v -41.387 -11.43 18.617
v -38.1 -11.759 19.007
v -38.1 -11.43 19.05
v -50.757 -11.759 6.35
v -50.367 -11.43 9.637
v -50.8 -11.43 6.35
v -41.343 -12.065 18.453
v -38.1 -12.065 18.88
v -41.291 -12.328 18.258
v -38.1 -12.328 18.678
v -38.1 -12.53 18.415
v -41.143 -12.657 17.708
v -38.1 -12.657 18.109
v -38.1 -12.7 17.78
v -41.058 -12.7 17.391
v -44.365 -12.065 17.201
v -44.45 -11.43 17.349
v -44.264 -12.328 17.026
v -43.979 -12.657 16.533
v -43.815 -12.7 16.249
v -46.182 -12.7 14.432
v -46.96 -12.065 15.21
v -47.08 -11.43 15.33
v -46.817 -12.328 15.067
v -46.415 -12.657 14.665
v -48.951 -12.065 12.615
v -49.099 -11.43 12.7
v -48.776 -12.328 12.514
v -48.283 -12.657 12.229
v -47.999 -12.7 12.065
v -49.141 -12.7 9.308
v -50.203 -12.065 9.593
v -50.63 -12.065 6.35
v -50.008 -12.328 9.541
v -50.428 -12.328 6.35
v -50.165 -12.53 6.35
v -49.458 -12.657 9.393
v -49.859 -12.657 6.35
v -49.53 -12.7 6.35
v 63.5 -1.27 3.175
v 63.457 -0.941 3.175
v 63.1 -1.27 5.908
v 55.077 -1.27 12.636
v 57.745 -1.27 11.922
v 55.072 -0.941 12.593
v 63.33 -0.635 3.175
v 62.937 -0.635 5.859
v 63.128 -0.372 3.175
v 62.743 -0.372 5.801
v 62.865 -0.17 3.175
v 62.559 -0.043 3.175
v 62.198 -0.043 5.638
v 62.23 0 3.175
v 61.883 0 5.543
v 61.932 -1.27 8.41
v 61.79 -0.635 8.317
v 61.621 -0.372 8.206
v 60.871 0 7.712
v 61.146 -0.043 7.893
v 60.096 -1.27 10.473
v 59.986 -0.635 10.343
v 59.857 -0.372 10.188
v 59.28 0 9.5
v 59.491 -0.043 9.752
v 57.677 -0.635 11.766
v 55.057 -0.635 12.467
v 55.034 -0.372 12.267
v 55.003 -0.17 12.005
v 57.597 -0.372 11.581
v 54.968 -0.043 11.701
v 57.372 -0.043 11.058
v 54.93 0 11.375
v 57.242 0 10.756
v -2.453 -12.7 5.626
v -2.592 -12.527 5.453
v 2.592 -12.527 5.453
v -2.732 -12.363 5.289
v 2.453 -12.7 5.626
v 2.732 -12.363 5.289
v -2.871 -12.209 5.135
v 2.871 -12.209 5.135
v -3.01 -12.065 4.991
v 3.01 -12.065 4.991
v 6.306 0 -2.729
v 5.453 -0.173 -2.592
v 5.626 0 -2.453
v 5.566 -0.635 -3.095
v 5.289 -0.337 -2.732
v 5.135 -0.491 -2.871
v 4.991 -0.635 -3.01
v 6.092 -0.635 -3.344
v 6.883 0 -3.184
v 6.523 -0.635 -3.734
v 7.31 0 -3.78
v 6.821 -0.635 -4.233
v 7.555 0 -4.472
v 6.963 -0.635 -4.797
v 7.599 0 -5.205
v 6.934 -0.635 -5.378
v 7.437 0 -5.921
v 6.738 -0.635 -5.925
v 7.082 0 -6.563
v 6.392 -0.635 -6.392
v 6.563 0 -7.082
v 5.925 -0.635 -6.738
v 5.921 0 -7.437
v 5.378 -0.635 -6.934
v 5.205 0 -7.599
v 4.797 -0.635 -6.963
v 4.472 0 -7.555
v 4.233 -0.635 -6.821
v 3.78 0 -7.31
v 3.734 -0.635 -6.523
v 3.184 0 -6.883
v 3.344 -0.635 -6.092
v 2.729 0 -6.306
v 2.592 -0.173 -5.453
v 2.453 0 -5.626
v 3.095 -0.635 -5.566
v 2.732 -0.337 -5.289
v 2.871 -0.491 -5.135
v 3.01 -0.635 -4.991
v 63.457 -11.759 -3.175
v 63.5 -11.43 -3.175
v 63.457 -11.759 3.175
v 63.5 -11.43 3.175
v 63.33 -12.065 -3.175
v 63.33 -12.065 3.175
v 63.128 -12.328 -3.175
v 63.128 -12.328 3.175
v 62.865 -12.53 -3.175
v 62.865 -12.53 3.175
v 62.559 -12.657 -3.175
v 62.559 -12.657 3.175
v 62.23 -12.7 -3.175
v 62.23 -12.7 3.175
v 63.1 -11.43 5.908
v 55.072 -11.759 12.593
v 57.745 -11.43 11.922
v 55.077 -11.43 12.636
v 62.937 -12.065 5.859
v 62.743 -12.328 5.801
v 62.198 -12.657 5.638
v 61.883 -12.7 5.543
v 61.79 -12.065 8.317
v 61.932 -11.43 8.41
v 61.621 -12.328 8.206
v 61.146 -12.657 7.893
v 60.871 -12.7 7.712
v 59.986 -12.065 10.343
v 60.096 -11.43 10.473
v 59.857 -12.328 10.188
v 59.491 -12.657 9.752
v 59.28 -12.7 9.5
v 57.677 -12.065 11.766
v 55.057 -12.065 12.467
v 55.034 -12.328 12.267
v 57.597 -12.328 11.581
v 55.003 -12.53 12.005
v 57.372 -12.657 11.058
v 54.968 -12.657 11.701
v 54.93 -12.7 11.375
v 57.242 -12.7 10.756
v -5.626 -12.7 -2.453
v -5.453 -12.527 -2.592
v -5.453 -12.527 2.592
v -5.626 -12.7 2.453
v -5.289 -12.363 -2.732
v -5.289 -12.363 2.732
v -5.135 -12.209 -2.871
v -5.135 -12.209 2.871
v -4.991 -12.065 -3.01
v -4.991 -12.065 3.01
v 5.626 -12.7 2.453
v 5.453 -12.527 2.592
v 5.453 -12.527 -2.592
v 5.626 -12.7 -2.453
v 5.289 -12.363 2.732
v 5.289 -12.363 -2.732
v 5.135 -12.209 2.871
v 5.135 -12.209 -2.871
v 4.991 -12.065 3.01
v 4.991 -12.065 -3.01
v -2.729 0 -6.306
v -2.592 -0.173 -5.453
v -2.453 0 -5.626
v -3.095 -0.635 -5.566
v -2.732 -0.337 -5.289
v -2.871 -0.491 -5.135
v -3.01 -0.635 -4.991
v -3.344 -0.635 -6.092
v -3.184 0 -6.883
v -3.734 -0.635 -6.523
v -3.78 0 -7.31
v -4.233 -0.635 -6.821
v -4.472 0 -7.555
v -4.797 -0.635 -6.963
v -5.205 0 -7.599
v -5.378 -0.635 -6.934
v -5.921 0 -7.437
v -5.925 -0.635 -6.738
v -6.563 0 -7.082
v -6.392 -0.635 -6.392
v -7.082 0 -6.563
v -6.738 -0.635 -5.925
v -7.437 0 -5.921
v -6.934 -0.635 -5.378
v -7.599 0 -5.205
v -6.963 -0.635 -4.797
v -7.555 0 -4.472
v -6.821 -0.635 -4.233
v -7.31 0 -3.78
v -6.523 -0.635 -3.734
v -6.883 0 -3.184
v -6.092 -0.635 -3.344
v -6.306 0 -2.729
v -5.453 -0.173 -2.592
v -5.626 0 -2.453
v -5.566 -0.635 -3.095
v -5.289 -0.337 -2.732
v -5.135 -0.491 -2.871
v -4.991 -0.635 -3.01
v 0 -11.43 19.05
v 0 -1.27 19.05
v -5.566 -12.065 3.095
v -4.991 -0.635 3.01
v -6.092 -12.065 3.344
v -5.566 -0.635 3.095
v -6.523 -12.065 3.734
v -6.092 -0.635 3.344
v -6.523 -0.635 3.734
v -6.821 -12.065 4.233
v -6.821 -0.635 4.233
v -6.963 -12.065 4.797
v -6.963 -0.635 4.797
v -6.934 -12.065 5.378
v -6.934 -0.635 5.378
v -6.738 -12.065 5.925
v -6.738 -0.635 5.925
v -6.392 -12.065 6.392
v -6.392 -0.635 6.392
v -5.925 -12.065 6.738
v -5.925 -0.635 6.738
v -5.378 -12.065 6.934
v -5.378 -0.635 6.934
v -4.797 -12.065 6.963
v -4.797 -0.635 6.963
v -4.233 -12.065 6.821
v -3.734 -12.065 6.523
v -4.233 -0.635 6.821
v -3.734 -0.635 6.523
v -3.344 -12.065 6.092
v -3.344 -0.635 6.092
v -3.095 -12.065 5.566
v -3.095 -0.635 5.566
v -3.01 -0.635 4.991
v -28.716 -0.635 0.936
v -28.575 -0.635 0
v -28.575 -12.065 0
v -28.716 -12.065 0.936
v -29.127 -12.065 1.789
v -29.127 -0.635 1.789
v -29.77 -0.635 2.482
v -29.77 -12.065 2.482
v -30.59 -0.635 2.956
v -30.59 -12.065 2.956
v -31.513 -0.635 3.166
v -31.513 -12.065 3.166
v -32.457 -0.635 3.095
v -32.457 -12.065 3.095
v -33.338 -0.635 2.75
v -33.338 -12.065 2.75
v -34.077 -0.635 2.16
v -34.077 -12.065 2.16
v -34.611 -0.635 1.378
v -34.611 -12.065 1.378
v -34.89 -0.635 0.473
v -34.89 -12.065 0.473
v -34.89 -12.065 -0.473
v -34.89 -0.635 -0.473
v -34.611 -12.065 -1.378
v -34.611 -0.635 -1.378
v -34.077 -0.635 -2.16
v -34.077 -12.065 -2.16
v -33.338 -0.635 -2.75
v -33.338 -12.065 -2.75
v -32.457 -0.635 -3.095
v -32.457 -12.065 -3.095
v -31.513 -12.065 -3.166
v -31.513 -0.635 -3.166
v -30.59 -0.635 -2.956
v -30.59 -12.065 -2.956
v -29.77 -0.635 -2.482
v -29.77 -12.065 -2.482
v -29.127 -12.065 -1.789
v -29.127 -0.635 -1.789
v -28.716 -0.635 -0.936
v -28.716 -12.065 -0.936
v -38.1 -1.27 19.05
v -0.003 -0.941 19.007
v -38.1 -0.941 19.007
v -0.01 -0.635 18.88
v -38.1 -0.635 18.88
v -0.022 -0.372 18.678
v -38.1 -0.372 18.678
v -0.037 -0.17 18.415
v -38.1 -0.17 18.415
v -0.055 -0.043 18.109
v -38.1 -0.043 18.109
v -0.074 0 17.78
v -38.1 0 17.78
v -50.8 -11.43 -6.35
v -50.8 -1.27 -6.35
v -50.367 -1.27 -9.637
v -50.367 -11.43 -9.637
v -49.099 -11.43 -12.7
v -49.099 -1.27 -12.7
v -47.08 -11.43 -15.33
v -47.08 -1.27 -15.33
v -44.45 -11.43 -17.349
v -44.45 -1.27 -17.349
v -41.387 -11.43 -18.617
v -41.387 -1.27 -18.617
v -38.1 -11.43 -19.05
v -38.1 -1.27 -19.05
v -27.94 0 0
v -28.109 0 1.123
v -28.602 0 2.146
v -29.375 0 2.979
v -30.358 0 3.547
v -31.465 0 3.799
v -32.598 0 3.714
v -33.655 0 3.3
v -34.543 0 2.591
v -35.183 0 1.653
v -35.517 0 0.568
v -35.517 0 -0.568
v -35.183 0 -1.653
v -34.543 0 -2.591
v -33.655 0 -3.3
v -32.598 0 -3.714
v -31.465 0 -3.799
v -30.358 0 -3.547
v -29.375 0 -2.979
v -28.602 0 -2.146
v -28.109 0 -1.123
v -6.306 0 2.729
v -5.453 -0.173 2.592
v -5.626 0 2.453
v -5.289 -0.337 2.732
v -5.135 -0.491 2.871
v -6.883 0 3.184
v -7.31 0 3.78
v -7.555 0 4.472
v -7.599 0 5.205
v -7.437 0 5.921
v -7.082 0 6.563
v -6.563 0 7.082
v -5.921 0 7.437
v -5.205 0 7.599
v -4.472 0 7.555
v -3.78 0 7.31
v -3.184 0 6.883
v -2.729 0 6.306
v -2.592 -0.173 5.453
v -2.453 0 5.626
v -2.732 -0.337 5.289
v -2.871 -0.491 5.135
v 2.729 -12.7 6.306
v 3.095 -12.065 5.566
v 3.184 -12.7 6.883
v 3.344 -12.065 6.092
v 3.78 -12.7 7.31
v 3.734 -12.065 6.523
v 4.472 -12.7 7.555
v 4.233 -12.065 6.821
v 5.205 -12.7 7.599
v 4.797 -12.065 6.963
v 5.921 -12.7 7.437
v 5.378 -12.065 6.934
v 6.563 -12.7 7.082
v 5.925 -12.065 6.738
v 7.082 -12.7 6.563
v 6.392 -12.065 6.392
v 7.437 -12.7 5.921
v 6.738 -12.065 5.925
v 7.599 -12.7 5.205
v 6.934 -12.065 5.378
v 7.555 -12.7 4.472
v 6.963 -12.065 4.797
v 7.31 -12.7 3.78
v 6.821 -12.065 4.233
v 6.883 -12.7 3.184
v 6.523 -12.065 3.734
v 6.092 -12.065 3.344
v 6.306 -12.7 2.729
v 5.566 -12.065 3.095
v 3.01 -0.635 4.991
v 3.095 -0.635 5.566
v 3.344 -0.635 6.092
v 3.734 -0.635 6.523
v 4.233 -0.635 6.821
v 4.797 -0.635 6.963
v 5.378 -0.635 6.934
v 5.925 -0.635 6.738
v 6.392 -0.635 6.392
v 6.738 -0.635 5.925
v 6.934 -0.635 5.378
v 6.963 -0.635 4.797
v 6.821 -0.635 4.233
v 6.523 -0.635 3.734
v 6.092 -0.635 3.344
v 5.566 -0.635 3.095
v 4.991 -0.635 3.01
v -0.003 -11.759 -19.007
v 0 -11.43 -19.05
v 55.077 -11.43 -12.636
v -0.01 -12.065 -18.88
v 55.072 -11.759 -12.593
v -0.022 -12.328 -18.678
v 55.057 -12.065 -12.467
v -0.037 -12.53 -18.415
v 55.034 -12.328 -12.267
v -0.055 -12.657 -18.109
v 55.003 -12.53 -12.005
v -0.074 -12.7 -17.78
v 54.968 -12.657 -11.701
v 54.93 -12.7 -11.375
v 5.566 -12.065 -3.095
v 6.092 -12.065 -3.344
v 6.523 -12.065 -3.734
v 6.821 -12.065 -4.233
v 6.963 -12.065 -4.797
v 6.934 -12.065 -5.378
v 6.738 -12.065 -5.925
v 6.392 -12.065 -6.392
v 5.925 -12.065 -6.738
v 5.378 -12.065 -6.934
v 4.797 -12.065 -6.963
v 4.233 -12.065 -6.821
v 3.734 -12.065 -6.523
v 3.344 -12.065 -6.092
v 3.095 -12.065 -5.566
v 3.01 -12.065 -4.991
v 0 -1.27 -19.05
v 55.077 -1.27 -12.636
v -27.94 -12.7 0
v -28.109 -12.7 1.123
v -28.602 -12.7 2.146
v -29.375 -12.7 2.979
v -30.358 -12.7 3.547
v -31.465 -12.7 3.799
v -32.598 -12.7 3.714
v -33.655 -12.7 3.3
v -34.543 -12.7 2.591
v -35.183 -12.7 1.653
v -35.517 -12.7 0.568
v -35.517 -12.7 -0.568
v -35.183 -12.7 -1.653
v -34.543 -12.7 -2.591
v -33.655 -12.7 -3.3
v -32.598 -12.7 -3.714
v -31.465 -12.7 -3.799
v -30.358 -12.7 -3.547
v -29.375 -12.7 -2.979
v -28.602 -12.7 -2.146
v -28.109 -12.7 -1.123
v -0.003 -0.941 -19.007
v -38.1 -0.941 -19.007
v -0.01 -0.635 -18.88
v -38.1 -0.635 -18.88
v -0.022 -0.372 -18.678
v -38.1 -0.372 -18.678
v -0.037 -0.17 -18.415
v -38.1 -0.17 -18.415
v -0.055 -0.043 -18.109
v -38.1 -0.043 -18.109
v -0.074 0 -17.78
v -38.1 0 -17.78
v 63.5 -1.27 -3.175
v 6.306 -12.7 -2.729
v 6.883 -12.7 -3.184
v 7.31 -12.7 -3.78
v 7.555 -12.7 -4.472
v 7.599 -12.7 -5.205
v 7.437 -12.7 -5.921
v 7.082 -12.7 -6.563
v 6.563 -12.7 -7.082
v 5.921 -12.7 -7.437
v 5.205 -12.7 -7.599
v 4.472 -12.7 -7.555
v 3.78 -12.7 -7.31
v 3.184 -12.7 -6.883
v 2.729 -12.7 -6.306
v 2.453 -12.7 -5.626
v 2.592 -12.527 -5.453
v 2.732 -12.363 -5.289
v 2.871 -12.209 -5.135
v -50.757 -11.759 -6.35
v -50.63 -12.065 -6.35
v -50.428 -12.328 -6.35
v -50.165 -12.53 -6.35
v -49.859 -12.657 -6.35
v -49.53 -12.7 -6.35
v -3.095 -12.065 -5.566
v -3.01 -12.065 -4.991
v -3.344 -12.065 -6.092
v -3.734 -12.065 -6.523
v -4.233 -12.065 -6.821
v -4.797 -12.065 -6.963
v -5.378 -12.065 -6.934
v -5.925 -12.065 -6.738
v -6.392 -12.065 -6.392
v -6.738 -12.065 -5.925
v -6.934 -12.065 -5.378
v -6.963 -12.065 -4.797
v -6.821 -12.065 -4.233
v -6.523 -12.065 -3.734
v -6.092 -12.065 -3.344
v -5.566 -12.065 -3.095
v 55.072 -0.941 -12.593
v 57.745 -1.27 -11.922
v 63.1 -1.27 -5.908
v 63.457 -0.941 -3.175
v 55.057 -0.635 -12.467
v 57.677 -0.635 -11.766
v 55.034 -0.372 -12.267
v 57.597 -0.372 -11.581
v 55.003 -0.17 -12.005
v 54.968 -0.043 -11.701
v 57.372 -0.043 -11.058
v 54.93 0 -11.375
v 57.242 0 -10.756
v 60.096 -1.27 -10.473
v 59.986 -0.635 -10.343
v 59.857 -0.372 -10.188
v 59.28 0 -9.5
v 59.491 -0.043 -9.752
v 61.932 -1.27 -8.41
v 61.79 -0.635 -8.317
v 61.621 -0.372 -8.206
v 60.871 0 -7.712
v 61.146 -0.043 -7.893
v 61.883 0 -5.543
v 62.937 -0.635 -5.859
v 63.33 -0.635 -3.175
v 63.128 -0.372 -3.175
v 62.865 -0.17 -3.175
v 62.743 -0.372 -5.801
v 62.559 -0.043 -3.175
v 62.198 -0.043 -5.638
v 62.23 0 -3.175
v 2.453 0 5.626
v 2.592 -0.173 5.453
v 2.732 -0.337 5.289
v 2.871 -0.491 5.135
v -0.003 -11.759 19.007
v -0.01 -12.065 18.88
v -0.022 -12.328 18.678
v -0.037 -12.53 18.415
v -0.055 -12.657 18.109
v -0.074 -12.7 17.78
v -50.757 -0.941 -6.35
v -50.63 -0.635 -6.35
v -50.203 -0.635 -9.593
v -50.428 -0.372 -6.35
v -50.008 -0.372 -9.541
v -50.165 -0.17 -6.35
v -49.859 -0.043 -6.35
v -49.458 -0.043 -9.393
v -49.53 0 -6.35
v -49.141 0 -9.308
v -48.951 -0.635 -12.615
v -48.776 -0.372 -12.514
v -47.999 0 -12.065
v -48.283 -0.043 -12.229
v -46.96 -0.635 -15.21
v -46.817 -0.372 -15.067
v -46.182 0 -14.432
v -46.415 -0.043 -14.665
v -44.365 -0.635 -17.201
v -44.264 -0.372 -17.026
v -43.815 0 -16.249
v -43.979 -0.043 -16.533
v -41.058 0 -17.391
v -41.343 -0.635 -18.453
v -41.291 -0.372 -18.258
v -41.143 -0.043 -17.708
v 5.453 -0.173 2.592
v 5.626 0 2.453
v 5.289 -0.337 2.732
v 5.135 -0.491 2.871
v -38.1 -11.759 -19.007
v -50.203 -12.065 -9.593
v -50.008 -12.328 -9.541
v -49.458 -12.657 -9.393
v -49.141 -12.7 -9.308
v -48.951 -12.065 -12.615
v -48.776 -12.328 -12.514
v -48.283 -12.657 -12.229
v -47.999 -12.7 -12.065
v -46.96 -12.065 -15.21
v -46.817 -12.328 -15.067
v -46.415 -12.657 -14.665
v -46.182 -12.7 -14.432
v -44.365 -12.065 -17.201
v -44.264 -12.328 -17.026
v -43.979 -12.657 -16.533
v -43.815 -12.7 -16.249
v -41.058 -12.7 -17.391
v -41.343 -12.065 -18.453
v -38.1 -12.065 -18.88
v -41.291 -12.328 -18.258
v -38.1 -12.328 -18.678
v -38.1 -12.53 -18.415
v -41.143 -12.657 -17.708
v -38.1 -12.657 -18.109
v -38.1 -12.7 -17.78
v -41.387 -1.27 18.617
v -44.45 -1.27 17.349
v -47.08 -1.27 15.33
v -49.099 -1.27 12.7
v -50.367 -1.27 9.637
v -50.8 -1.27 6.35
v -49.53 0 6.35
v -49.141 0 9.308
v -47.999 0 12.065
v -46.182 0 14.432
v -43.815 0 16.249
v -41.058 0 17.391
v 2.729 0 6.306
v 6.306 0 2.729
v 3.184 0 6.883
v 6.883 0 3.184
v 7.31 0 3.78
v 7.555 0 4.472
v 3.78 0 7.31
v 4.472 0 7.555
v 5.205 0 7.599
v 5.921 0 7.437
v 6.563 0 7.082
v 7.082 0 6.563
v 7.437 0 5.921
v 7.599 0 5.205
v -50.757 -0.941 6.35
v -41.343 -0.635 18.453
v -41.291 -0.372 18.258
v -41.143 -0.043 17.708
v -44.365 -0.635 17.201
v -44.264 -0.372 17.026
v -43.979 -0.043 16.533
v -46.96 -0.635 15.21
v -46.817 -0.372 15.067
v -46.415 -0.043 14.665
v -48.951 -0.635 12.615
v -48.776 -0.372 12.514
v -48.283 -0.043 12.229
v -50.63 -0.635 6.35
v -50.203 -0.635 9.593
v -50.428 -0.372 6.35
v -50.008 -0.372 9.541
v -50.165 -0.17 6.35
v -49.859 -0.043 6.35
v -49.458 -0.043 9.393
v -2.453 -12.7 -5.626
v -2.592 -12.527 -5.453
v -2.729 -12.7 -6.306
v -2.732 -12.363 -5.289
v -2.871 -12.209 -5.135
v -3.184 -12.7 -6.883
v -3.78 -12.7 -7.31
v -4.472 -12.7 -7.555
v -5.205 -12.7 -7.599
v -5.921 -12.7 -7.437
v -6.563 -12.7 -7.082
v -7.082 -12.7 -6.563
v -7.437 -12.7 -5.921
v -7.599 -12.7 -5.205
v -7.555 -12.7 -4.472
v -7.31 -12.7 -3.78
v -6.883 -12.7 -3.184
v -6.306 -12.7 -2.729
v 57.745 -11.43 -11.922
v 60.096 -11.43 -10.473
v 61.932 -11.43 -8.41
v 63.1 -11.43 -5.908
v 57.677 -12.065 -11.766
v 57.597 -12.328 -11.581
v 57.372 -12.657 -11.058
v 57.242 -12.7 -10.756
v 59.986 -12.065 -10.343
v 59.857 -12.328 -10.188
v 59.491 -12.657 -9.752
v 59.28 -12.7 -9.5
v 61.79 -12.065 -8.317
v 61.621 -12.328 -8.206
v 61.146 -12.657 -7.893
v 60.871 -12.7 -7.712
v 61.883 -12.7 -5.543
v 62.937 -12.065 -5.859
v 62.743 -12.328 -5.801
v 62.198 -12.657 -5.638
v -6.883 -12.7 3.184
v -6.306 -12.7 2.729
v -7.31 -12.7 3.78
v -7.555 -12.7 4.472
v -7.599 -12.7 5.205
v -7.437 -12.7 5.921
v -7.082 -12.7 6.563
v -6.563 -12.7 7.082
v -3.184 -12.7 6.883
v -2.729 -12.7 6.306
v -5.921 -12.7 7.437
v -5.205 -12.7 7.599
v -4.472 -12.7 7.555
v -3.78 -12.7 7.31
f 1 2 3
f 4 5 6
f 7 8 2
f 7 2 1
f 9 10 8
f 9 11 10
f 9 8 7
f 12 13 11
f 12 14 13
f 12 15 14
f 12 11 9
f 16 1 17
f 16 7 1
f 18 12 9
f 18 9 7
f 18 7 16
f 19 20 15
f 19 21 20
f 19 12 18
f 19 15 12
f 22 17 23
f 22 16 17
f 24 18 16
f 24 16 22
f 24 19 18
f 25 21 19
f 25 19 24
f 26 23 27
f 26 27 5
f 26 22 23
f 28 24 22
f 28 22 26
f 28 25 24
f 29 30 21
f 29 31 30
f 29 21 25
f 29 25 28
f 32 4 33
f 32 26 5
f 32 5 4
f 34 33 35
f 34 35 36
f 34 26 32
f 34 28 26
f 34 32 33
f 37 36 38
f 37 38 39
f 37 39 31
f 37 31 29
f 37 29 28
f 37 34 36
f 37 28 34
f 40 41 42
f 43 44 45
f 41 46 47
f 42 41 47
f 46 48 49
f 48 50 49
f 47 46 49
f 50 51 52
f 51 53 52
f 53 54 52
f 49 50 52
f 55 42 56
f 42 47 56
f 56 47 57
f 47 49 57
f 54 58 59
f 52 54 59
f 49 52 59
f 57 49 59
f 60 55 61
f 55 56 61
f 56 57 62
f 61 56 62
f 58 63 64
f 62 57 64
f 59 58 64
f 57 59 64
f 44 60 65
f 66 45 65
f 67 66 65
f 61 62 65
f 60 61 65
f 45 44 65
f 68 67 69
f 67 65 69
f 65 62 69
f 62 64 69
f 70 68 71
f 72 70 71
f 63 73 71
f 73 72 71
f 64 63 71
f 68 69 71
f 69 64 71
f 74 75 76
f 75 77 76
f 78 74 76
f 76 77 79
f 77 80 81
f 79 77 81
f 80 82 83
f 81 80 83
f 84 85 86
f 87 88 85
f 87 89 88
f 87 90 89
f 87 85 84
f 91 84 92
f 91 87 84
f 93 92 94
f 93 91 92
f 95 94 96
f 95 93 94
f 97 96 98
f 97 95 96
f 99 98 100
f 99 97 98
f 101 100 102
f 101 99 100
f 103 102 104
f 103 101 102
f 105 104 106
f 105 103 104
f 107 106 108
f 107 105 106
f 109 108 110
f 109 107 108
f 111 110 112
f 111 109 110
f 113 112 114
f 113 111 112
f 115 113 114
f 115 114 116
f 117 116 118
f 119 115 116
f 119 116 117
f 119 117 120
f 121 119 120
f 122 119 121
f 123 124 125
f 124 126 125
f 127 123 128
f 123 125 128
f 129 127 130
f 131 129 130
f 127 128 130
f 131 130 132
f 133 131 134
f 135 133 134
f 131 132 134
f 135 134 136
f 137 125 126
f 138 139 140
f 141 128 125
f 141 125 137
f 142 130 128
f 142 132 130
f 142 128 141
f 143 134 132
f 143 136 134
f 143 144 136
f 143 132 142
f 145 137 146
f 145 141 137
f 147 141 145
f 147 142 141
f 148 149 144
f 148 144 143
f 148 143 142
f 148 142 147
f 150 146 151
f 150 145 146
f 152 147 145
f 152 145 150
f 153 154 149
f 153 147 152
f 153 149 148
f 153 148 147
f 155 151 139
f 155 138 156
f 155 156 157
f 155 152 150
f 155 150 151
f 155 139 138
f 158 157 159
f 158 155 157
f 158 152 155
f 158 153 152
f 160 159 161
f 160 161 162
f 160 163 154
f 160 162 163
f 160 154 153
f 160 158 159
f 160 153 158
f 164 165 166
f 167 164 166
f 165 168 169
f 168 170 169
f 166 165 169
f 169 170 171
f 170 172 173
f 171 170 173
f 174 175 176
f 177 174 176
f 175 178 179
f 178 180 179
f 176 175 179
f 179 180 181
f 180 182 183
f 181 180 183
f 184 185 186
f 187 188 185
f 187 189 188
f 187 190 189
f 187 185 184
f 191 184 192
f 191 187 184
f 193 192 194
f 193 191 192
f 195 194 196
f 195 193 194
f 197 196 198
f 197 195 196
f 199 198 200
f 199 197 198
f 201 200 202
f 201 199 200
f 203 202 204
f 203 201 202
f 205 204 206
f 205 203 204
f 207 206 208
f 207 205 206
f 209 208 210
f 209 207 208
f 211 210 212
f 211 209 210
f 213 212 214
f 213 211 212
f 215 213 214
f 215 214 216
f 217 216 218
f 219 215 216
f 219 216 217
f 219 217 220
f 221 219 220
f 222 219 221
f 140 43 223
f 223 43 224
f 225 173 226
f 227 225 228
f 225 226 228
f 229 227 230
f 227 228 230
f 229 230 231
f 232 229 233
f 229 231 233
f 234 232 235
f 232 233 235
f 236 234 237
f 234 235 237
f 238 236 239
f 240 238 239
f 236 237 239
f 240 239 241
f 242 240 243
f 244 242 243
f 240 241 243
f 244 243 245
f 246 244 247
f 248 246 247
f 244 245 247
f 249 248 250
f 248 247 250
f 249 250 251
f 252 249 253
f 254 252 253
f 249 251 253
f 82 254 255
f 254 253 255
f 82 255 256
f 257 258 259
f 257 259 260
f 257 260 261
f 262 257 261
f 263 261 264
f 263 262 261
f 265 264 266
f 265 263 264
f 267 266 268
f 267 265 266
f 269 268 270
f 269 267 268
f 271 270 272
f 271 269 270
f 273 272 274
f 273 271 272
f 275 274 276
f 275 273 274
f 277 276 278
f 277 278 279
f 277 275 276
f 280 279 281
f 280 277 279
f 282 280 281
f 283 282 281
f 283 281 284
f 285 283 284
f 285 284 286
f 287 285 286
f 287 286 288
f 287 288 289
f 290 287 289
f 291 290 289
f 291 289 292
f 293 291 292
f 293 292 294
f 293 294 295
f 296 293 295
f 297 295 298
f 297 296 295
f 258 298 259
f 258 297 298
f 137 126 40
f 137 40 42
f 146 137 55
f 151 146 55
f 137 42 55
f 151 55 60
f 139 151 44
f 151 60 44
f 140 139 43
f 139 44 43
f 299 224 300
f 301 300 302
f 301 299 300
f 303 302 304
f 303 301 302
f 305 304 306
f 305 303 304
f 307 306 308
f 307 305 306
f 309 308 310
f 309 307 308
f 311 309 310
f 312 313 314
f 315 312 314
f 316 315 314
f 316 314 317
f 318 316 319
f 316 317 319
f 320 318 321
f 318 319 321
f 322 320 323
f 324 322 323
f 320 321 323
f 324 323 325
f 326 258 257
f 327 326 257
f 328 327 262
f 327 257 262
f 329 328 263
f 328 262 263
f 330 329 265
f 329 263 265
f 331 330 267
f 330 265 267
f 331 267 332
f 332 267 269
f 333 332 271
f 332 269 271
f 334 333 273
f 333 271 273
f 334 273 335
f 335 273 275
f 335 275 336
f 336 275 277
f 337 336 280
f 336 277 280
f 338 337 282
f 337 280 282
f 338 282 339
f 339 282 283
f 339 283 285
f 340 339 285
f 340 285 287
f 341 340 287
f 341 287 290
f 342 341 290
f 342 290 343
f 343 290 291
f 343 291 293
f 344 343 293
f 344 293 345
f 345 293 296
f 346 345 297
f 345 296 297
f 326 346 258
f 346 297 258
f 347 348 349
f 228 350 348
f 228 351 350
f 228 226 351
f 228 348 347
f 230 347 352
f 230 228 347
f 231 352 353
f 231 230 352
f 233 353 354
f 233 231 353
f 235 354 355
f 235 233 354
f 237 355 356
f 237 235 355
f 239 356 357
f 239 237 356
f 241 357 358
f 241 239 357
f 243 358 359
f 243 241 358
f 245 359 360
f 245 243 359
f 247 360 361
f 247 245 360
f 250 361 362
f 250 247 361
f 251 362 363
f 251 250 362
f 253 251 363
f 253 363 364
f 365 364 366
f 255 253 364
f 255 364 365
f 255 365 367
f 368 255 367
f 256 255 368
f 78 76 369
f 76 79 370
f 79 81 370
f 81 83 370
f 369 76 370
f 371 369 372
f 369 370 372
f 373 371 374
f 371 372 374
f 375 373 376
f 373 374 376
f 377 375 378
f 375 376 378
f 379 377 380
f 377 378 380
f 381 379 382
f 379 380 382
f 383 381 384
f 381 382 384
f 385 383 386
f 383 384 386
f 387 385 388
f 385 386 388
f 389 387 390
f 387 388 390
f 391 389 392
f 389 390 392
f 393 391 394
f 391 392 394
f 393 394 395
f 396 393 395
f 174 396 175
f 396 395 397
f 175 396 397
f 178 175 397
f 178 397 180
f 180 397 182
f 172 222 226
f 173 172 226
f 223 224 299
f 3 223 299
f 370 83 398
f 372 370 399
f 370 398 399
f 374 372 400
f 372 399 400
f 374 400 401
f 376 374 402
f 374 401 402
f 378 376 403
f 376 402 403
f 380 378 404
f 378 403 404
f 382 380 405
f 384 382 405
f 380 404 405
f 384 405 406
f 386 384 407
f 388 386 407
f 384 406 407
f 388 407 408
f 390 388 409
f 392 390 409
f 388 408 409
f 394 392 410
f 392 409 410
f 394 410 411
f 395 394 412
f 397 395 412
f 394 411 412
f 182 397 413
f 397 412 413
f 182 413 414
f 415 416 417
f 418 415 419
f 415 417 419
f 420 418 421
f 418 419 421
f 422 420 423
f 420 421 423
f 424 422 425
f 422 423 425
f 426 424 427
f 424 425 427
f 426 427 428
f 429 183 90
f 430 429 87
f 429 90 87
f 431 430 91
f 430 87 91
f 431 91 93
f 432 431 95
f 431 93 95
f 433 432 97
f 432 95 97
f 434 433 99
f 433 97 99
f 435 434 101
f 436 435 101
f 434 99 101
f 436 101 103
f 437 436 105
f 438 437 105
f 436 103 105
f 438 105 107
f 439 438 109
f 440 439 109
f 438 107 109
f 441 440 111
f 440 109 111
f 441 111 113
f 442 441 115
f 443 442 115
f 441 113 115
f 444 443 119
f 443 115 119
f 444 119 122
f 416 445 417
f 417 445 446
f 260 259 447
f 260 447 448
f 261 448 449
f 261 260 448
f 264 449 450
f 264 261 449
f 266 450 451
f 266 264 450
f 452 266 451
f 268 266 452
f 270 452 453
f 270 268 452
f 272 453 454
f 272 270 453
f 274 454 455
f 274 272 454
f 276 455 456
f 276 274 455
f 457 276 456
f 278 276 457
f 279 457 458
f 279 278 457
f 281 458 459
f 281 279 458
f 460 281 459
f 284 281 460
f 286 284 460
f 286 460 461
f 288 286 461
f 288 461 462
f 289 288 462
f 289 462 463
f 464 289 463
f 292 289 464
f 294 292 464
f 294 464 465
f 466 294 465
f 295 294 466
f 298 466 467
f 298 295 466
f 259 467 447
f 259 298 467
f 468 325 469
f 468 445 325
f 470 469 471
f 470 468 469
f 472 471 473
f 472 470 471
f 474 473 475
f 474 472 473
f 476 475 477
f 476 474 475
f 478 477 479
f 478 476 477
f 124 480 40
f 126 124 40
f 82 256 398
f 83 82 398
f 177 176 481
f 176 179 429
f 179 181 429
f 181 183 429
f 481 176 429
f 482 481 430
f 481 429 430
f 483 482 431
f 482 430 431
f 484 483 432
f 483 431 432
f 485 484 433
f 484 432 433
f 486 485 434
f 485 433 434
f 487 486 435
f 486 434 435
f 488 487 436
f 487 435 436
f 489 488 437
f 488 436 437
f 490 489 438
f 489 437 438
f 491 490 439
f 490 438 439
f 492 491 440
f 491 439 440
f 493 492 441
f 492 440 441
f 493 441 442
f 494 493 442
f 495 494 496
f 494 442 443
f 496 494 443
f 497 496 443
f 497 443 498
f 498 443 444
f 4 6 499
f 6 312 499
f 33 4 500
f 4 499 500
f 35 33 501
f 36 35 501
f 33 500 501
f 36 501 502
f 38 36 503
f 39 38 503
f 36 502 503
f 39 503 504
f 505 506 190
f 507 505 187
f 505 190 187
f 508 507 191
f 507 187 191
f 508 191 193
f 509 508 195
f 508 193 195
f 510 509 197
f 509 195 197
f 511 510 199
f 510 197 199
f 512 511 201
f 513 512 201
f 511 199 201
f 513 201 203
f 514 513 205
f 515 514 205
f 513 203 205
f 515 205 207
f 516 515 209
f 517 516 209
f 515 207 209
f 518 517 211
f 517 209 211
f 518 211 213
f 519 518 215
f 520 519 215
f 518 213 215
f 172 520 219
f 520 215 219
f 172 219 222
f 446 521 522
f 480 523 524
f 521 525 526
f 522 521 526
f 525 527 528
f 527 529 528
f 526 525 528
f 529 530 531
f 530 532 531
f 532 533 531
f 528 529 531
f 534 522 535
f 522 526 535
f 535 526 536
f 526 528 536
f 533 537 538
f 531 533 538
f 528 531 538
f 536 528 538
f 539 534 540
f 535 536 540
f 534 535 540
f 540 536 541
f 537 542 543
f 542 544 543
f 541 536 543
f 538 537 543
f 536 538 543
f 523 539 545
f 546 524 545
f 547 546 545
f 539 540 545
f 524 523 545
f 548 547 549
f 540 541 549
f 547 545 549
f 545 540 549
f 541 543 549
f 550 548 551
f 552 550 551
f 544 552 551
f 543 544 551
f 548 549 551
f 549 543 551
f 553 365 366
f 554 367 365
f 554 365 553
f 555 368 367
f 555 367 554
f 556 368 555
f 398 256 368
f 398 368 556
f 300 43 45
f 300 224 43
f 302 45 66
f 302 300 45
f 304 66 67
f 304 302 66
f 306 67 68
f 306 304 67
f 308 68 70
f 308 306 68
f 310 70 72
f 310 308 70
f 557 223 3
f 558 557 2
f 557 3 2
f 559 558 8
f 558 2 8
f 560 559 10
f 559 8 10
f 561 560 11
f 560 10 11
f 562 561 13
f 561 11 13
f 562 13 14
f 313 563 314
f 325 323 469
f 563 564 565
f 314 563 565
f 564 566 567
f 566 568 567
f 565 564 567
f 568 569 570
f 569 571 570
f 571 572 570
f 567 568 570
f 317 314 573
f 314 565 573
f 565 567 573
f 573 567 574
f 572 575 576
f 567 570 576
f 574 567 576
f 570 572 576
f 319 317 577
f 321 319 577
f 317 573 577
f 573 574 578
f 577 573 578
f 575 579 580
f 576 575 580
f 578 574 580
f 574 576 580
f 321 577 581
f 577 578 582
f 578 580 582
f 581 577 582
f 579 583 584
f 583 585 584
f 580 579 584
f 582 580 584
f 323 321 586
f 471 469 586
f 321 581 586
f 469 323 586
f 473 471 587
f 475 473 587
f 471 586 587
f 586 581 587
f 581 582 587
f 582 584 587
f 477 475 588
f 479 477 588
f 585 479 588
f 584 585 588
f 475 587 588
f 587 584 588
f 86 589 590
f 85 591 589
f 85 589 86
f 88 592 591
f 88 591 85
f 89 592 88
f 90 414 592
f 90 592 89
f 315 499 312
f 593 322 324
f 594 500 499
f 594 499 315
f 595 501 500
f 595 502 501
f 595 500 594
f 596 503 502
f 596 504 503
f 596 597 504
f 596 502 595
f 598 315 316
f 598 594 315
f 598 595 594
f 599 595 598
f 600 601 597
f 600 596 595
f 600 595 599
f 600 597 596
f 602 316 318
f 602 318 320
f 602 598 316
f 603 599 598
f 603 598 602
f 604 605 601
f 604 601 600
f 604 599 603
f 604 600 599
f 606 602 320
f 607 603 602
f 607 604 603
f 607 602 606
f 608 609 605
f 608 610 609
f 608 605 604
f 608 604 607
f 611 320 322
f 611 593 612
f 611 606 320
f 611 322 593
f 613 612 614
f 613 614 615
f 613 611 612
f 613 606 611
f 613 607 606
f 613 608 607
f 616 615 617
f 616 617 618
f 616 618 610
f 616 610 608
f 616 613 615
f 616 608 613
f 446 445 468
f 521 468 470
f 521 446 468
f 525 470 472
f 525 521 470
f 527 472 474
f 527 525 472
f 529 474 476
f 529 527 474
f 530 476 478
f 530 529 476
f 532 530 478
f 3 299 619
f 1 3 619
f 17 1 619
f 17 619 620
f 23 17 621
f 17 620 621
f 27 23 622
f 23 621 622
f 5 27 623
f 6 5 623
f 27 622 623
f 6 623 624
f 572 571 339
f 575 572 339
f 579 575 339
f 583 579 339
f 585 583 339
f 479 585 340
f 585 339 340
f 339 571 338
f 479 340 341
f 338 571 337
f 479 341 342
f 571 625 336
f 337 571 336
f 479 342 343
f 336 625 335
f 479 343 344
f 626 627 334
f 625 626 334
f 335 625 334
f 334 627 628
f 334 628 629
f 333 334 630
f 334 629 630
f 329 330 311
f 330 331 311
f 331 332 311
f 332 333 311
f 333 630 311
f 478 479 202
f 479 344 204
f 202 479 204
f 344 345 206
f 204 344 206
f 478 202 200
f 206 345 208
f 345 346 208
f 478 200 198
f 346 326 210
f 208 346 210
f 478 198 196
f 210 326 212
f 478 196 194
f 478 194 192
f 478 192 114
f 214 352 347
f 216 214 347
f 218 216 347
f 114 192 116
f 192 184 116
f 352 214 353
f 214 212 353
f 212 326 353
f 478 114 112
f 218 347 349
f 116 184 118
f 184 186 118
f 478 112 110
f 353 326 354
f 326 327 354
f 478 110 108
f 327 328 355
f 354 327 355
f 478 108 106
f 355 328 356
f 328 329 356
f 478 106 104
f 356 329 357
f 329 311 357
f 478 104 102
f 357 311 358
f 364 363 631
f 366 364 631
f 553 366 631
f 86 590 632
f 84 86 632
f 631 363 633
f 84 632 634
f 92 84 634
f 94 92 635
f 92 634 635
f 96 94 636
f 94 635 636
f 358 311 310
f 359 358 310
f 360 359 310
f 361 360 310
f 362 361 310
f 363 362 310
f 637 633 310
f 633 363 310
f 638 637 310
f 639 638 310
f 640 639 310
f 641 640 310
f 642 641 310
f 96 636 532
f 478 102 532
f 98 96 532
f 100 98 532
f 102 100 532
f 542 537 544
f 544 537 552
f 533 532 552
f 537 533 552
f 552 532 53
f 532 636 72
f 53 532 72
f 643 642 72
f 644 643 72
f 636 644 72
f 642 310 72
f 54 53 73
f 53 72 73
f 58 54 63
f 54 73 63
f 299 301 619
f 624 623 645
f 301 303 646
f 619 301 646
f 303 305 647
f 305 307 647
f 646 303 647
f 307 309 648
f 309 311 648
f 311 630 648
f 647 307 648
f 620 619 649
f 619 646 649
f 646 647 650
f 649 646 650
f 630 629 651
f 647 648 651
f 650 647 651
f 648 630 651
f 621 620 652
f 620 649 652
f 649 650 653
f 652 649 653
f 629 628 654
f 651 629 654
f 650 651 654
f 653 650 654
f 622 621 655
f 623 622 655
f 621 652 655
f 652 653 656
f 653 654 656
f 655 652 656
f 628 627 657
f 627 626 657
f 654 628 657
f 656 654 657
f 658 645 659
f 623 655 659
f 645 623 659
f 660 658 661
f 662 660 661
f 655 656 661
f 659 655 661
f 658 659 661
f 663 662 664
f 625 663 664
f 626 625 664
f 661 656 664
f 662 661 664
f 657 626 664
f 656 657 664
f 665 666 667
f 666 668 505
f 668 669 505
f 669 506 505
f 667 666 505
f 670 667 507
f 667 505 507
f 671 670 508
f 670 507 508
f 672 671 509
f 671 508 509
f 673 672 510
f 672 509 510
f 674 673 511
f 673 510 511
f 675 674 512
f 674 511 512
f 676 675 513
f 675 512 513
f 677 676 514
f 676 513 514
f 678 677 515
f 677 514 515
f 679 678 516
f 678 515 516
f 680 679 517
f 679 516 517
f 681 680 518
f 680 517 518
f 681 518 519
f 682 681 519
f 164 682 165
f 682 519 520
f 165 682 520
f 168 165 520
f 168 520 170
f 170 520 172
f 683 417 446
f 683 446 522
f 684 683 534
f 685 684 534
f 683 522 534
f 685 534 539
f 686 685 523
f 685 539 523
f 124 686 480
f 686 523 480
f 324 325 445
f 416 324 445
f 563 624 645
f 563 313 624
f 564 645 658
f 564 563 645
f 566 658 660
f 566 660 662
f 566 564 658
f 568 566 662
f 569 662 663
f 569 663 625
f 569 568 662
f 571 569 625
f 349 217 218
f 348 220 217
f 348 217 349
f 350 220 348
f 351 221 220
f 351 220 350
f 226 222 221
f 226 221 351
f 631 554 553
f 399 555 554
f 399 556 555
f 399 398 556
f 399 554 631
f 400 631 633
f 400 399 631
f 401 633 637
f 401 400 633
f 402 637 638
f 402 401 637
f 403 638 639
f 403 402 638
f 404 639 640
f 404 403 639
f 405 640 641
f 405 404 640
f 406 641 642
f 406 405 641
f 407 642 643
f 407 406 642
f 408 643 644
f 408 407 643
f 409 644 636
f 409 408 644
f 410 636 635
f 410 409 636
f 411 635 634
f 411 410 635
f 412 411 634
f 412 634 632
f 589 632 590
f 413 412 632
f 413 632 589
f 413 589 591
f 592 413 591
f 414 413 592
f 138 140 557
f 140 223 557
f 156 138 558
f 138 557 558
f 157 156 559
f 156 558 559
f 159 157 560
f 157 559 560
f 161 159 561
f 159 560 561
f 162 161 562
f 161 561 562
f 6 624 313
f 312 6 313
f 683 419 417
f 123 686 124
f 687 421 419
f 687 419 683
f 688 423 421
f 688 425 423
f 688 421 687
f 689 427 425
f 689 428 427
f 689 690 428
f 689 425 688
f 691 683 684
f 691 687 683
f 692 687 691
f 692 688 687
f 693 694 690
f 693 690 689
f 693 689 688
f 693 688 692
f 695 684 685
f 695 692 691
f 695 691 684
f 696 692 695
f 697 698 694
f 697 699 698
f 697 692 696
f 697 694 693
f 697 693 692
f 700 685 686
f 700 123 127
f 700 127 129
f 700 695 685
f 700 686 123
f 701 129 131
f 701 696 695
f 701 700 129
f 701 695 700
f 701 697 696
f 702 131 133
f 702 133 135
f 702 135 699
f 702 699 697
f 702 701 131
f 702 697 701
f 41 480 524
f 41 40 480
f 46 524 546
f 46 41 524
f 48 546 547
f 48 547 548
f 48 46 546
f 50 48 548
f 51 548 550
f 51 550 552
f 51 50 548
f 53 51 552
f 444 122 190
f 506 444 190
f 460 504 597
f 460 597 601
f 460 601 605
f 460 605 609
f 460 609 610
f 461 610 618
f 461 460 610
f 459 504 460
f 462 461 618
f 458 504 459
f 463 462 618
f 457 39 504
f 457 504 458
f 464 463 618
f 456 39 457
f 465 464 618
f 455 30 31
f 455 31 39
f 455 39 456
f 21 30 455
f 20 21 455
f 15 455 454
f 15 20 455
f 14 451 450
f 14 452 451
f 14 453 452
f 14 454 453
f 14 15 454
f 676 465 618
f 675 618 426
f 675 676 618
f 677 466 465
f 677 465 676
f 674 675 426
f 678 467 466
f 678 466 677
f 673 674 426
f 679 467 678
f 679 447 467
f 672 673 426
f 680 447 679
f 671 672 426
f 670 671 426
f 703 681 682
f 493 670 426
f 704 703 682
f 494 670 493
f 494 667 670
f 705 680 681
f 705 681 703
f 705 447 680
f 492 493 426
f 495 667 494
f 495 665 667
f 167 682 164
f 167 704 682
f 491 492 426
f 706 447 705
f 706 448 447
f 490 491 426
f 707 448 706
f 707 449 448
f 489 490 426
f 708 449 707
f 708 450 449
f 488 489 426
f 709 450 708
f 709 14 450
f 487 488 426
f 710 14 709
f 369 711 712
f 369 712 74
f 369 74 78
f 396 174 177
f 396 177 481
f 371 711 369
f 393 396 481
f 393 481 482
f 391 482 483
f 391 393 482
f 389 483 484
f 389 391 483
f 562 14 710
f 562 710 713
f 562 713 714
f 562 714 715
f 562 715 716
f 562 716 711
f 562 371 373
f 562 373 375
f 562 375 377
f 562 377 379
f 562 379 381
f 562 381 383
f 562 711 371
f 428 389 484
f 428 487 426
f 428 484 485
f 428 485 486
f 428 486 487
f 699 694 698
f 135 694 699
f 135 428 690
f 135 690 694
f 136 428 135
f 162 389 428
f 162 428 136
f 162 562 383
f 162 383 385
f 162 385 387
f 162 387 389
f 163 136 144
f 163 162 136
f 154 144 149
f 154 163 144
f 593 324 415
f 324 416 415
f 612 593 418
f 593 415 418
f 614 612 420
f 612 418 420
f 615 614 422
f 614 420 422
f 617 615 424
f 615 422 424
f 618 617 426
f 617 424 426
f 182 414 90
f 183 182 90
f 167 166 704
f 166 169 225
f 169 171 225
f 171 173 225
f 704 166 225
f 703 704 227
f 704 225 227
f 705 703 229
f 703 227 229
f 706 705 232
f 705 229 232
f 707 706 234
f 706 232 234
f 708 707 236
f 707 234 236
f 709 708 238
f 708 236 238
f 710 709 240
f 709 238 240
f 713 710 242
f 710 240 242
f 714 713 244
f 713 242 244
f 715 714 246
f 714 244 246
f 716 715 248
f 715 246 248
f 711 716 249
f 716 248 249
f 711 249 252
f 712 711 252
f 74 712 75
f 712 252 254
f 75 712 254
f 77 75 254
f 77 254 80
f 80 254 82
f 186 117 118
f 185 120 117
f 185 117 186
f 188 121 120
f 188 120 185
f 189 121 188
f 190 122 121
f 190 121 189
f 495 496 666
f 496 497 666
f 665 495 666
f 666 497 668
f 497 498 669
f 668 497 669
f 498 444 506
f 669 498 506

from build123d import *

# Parameters (mm, degrees)
F0_R     = 3.175
F1_DEPTH = 12.7
F2_R     = 1.27
F3_SIZE  = 0.635


with BuildPart() as f1:
    # F0 (on Front) → F1 (new body)
    with BuildSketch(Plane.XZ):
        with BuildLine():
            Line((-38.1, -19.05), (0, -19.05))
            Line((0, -19.05), (55.076783, -12.636062))
            ThreePointArc((55.076783, -12.636062), (61.089074, -9.508685), (63.5, -3.175))
            Line((63.5, -3.175), (63.5, 3.175))
            ThreePointArc((63.5, 3.175), (61.089074, 9.508685), (55.076783, 12.636062))
            Line((55.076783, 12.636062), (0, 19.05))
            Line((0, 19.05), (-38.1, 19.05))
            ThreePointArc((-38.1, 19.05), (-47.080256, 15.330256), (-50.8, 6.35))
            Line((-50.8, 6.35), (-50.8, -6.35))
            ThreePointArc((-50.8, -6.35), (-47.080256, -15.330256), (-38.1, -19.05))
        make_face()
        with Locations((-31.75, 0)):
            Circle(F0_R, mode=Mode.SUBTRACT)
        with BuildLine():
            ThreePointArc((4.9911, -3.0099), (6.39202, -6.39202), (3.0099, -4.9911))
            Line((3.0099, -4.9911), (-3.0099, -4.9911))
            ThreePointArc((-3.0099, -4.9911), (-6.39202, -6.39202), (-4.9911, -3.0099))
            Line((-4.9911, -3.0099), (-4.9911, 3.0099))
            ThreePointArc((-4.9911, 3.0099), (-6.39202, 6.39202), (-3.0099, 4.9911))
            Line((-3.0099, 4.9911), (3.0099, 4.9911))
            ThreePointArc((3.0099, 4.9911), (6.39202, 6.39202), (4.9911, 3.0099))
            Line((4.9911, 3.0099), (4.9911, -3.0099))
        make_face(mode=Mode.SUBTRACT)
    extrude(amount=F1_DEPTH)

    # F2
    f2_edges = [f1.edges().sort_by_distance(p)[0] for p in [
        (-19.05, -12.7, 19.05),
        (27.538392, -12.7, 15.843031),
        (-19.05, 0, 19.05),
        (27.538392, 0, 15.843031),
    ]]
    fillet(f2_edges, radius=F2_R)

    # F3
    f3_edges = [f1.edges().sort_by_distance(p)[0] for p in [
        (-34.925, -12.7, 0),
        (-4.9911, -12.7, 0),
        (0, -12.7, 4.9911),
        (4.9911, -12.7, 0),
        (0, -12.7, -4.9911),
        (6.39202, -12.7, -6.39202),
        (-6.39202, -12.7, -6.39202),
        (-6.39202, -12.7, 6.39202),
        (6.39202, -12.7, 6.39202),
        (-34.925, 0, 0),
        (-4.9911, 0, 0),
        (-6.39202, 0, 6.39202),
        (0, 0, 4.9911),
        (6.39202, 0, 6.39202),
        (4.9911, 0, 0),
        (6.39202, 0, -6.39202),
        (0, 0, -4.9911),
        (-6.39202, 0, -6.39202),
    ]]
    chamfer(f3_edges, length=F3_SIZE)


solid = f1.part
